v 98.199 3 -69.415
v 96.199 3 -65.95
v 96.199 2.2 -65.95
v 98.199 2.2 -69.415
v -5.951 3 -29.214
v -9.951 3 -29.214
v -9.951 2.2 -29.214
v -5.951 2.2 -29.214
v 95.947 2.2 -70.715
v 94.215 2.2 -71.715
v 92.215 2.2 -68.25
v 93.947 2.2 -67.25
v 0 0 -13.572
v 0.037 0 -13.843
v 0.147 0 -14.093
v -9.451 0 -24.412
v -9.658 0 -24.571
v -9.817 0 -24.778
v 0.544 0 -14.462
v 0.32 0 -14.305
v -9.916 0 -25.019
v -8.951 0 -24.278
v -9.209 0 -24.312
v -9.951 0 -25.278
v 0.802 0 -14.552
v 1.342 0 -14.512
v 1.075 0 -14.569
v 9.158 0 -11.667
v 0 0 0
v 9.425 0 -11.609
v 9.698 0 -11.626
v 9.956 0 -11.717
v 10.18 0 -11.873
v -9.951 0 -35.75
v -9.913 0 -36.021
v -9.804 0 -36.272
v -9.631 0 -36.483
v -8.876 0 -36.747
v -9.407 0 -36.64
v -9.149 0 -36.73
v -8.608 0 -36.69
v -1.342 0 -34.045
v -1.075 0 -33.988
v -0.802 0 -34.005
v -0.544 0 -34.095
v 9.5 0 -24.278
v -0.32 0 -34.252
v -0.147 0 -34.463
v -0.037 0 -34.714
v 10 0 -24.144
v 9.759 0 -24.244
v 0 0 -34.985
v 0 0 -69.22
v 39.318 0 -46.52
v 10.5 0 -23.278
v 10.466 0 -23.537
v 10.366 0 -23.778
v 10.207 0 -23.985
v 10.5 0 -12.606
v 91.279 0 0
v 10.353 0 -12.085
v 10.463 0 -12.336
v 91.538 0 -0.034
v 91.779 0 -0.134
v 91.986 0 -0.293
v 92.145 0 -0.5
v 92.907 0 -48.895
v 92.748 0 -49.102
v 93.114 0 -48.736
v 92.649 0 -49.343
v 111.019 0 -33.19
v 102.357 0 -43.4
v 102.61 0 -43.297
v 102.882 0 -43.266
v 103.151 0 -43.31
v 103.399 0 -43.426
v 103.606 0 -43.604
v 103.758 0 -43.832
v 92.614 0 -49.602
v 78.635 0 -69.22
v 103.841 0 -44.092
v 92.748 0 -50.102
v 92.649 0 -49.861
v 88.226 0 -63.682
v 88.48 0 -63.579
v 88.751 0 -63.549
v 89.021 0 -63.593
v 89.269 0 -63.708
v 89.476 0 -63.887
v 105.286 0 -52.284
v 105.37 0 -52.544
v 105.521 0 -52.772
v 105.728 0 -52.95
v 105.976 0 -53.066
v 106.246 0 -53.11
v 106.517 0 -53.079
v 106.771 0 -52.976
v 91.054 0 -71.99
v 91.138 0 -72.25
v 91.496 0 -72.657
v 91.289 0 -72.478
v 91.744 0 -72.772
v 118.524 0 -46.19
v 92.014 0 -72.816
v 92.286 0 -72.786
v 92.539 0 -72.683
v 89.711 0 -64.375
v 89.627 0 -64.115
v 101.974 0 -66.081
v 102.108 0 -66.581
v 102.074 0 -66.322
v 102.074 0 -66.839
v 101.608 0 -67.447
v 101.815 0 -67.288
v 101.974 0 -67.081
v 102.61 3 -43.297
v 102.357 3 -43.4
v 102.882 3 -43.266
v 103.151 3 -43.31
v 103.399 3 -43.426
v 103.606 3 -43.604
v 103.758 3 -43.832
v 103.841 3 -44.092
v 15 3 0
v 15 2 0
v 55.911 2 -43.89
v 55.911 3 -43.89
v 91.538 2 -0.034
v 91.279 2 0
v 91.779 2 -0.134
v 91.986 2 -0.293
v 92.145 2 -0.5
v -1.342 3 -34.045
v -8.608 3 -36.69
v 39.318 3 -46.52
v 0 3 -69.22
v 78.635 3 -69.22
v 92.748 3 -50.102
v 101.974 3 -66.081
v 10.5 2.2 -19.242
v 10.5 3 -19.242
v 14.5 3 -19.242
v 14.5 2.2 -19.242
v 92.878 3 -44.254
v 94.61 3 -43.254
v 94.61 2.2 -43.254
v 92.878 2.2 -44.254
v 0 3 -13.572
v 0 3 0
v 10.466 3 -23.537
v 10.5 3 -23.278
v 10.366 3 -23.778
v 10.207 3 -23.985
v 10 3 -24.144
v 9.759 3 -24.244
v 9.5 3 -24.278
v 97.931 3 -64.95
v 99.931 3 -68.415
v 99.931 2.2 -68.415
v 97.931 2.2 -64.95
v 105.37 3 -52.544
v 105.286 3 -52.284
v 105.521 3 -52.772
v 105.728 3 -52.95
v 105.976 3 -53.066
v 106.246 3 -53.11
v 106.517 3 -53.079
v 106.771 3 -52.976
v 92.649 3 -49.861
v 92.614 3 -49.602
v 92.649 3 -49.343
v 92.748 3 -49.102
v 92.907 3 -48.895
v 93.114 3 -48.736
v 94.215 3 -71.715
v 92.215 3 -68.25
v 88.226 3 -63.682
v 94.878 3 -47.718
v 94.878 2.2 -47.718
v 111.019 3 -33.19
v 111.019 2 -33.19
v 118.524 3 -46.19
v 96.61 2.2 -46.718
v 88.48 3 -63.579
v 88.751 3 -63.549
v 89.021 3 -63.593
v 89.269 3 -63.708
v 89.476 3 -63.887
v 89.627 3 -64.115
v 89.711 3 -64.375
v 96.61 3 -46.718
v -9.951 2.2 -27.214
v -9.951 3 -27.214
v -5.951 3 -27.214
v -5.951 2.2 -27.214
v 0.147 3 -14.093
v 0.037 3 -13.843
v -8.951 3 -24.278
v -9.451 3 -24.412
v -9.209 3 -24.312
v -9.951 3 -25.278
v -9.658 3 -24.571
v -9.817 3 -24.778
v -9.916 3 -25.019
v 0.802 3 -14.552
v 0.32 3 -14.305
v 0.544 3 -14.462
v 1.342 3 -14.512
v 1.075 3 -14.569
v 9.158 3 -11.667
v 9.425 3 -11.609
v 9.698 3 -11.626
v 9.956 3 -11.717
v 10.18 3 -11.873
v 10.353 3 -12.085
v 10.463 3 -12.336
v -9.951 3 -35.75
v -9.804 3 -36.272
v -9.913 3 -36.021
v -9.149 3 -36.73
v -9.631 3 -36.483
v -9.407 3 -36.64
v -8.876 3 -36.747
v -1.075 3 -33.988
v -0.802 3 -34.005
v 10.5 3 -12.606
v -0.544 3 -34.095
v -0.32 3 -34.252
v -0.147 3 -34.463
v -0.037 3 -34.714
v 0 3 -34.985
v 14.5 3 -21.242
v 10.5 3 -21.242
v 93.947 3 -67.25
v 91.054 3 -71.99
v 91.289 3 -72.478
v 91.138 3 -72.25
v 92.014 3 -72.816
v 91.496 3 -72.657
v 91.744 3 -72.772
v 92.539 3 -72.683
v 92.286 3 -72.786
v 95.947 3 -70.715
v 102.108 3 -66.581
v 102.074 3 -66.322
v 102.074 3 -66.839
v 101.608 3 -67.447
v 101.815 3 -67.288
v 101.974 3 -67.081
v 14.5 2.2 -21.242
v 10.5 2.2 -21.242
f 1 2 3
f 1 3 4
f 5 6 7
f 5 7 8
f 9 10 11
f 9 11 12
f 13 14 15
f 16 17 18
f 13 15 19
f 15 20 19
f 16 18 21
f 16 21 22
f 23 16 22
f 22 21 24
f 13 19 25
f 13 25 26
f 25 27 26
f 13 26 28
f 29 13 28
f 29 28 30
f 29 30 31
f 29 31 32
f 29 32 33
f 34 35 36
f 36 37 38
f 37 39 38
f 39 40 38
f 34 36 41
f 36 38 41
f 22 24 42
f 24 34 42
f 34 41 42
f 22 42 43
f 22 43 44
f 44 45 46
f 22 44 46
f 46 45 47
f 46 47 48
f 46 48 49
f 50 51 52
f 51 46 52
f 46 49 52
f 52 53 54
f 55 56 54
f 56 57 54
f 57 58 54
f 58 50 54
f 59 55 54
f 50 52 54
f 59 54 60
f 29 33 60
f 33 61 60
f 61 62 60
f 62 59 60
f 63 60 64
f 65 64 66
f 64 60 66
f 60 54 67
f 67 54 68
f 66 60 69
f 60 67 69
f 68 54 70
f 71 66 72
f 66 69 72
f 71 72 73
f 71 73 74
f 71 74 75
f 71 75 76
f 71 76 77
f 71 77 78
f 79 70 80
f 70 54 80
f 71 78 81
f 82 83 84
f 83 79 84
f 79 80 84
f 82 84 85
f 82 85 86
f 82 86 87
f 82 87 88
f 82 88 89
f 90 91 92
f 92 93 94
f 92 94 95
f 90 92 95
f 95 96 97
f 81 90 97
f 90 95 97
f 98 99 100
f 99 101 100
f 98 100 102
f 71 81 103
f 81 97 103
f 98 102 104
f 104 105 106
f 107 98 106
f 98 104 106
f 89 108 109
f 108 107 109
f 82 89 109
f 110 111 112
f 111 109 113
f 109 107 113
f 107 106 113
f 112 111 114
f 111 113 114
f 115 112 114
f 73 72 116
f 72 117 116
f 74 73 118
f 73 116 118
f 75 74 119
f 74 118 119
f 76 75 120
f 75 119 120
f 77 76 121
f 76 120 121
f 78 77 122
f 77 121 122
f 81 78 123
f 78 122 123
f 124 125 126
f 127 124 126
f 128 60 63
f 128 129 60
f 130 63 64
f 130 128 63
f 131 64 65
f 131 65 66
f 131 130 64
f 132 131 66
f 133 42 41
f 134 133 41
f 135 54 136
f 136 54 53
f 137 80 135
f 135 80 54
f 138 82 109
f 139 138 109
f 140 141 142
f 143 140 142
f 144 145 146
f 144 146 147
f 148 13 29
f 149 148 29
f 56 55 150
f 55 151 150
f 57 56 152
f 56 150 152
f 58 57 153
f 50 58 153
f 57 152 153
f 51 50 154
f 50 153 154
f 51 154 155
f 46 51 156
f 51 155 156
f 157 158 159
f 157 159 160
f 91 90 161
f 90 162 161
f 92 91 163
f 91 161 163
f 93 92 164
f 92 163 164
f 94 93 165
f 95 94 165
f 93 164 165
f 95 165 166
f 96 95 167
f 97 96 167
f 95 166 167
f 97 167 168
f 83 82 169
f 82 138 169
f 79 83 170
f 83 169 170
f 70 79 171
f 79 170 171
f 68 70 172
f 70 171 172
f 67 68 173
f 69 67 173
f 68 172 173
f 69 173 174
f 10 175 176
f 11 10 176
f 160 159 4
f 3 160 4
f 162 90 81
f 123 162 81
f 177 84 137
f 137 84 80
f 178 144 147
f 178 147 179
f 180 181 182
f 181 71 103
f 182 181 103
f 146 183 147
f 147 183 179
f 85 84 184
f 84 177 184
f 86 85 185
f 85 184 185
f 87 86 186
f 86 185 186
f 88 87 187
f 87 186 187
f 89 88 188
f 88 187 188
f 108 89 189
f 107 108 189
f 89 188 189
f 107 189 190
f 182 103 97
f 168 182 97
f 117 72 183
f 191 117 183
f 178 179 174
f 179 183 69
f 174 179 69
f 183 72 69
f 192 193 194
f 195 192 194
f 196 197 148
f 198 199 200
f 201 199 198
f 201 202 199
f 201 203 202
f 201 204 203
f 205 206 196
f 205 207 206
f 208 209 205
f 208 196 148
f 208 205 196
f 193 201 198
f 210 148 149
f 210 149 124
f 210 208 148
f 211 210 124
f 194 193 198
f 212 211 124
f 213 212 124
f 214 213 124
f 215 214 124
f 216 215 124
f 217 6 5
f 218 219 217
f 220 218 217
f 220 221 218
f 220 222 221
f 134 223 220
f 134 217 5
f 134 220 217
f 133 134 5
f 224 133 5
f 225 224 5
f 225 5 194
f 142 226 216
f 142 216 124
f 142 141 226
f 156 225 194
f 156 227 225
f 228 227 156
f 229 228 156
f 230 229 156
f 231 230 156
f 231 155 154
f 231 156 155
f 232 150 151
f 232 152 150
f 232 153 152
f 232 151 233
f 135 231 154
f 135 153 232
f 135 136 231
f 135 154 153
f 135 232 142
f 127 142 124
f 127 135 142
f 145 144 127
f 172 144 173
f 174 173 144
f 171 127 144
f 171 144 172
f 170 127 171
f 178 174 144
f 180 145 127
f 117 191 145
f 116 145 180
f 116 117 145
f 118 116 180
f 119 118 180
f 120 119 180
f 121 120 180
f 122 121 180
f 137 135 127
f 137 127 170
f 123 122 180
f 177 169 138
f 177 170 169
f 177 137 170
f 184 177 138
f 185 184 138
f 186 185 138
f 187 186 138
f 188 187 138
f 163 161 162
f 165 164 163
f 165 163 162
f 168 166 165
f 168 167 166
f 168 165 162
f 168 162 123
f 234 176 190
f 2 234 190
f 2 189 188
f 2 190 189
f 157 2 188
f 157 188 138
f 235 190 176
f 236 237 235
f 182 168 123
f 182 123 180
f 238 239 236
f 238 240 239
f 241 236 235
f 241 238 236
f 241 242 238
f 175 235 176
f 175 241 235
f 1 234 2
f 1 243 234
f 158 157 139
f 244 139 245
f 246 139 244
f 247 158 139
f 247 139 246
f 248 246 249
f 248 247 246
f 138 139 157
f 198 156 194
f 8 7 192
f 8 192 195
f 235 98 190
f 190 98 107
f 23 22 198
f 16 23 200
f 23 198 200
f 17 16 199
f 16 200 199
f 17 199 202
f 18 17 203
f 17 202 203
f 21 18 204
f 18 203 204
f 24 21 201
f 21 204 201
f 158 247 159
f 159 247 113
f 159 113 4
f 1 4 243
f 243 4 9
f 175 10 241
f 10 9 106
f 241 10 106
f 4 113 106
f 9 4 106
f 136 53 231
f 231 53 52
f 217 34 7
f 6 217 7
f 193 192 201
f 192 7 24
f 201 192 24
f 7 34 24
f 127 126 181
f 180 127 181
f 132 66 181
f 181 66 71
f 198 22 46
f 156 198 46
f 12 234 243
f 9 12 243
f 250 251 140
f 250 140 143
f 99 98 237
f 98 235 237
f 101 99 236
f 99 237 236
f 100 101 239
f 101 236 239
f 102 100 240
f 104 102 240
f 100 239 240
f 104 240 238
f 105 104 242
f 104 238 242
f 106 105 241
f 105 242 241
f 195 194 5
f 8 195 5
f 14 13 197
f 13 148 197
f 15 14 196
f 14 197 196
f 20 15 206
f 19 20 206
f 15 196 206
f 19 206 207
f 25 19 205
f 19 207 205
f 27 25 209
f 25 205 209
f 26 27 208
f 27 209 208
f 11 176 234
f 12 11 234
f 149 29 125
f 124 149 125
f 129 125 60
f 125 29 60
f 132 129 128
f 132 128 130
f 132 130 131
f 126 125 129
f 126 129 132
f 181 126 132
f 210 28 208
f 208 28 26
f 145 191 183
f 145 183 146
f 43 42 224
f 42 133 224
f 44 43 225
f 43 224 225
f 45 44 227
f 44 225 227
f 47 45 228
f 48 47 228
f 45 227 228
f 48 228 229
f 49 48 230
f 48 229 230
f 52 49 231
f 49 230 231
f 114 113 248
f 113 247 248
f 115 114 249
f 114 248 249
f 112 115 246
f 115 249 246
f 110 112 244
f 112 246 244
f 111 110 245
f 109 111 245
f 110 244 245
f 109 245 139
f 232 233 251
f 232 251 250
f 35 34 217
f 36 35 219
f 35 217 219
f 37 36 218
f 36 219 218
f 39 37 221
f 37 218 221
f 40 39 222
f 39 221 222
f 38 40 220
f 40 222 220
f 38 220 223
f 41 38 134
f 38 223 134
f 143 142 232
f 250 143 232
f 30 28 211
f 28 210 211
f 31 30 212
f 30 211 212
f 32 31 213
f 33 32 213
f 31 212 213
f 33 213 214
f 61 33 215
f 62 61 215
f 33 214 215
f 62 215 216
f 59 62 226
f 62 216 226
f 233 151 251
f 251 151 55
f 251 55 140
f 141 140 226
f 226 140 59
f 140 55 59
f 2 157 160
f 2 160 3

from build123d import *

# Parameters (mm, degrees)
P_IDAT_VYSUNUT_M1_DEPTH  = 3
P_IDAT_VYSUNUT_M2_DEPTH  = 2
ZAOBLIT1_R               = 1
ZAOBLIT2_R               = 1
SKICA2_W                 = 4
SKICA2_H                 = 2
ODEBRAT_VYSUNUT_M1_DEPTH = 0.8


with BuildPart() as part:
    # Skica1 → P_idat vysunut_m1 (new body)
    with BuildSketch(Plane(origin=(0, 0, 0), x_dir=(1, 0, 0), z_dir=(0, 1, 0))):
        Polygon((118.524103266, 46.190077074), (105.53372221, 53.690077074), (103.593400635, 42.685966604), (92.248467845, 49.235966604), (102.473720104, 66.946623035), (91.301992395, 73.396623035), (89.463213481, 62.968389614), (78.635106664, 69.22), (39.317553332, 46.52), (0, 69.22), (0, 33.55662508), (-9.950504516, 37.17831254), (-9.950504516, 24.27831254), (10.5, 24.27831254), (10.5, 11.17831254), (0, 15), (0, 0), (15, 0), (55.910618513, 43.889876884), (111.018549767, 33.190077074), align=None)
    extrude(amount=P_IDAT_VYSUNUT_M1_DEPTH)

    # Skica1_3 → P_idat vysunut_m2 (add)
    with BuildSketch(Plane(origin=(0, 0, 0), x_dir=(1, 0, 0), z_dir=(0, 1, 0))):
        Polygon((91.856249834, 0), (111.018549767, 33.190077074), (55.910618513, 43.889876884), (15, 0), align=None)
    extrude(amount=P_IDAT_VYSUNUT_M2_DEPTH)

    # Zaoblit1
    zaoblit1_edges = [part.edges().sort_by_distance(p)[0] for p in [
        (102.473720104, 1.5, -66.946623035),
        (92.248467845, 1.5, -49.235966604),
        (103.593400635, 1.5, -42.685966604),
        (105.53372221, 1.5, -53.690077074),
        (0, 1.5, -15),
        (10.5, 1.5, -11.17831254),
        (10.5, 1.5, -24.27831254),
        (-9.950504516, 1.5, -24.27831254),
        (-9.950504516, 1.5, -37.17831254),
        (0, 1.5, -33.55662508),
        (89.463213481, 1.5, -62.968389614),
        (91.301992395, 1.5, -73.396623035),
    ]]
    fillet(zaoblit1_edges, radius=ZAOBLIT1_R)

    # Zaoblit2
    zaoblit2_edges = [part.edges().sort_by_distance(p)[0] for p in [
        (91.856249834, 1, 0),
    ]]
    fillet(zaoblit2_edges, radius=ZAOBLIT2_R)

    # Skica2 → Odebrat vysunut_m1 (cut)
    with BuildSketch(Plane(origin=(0, 3, 0), x_dir=(1, 0, 0), z_dir=(0, 1, 0))):
        with Locations((-7.950504516, 28.214238537)):
            Rectangle(SKICA2_W, SKICA2_H)
        with Locations((12.5, 20.242386544)):
            Rectangle(SKICA2_W, SKICA2_H)
        Polygon((94.215365942, 71.714586034), (92.215365942, 68.250484418), (93.947416749, 67.250484418), (95.947416749, 70.714586034), align=None)
        Polygon((96.199082799, 65.950484418), (98.199082799, 69.414586034), (99.931133607, 68.414586034), (97.931133607, 64.950484418), align=None)
        Polygon((96.60970769, 46.718003606), (94.60970769, 43.253901991), (92.877656883, 44.253901991), (94.877656883, 47.718003606), align=None)
    extrude(amount=-ODEBRAT_VYSUNUT_M1_DEPTH, mode=Mode.SUBTRACT)


solid = part.part
